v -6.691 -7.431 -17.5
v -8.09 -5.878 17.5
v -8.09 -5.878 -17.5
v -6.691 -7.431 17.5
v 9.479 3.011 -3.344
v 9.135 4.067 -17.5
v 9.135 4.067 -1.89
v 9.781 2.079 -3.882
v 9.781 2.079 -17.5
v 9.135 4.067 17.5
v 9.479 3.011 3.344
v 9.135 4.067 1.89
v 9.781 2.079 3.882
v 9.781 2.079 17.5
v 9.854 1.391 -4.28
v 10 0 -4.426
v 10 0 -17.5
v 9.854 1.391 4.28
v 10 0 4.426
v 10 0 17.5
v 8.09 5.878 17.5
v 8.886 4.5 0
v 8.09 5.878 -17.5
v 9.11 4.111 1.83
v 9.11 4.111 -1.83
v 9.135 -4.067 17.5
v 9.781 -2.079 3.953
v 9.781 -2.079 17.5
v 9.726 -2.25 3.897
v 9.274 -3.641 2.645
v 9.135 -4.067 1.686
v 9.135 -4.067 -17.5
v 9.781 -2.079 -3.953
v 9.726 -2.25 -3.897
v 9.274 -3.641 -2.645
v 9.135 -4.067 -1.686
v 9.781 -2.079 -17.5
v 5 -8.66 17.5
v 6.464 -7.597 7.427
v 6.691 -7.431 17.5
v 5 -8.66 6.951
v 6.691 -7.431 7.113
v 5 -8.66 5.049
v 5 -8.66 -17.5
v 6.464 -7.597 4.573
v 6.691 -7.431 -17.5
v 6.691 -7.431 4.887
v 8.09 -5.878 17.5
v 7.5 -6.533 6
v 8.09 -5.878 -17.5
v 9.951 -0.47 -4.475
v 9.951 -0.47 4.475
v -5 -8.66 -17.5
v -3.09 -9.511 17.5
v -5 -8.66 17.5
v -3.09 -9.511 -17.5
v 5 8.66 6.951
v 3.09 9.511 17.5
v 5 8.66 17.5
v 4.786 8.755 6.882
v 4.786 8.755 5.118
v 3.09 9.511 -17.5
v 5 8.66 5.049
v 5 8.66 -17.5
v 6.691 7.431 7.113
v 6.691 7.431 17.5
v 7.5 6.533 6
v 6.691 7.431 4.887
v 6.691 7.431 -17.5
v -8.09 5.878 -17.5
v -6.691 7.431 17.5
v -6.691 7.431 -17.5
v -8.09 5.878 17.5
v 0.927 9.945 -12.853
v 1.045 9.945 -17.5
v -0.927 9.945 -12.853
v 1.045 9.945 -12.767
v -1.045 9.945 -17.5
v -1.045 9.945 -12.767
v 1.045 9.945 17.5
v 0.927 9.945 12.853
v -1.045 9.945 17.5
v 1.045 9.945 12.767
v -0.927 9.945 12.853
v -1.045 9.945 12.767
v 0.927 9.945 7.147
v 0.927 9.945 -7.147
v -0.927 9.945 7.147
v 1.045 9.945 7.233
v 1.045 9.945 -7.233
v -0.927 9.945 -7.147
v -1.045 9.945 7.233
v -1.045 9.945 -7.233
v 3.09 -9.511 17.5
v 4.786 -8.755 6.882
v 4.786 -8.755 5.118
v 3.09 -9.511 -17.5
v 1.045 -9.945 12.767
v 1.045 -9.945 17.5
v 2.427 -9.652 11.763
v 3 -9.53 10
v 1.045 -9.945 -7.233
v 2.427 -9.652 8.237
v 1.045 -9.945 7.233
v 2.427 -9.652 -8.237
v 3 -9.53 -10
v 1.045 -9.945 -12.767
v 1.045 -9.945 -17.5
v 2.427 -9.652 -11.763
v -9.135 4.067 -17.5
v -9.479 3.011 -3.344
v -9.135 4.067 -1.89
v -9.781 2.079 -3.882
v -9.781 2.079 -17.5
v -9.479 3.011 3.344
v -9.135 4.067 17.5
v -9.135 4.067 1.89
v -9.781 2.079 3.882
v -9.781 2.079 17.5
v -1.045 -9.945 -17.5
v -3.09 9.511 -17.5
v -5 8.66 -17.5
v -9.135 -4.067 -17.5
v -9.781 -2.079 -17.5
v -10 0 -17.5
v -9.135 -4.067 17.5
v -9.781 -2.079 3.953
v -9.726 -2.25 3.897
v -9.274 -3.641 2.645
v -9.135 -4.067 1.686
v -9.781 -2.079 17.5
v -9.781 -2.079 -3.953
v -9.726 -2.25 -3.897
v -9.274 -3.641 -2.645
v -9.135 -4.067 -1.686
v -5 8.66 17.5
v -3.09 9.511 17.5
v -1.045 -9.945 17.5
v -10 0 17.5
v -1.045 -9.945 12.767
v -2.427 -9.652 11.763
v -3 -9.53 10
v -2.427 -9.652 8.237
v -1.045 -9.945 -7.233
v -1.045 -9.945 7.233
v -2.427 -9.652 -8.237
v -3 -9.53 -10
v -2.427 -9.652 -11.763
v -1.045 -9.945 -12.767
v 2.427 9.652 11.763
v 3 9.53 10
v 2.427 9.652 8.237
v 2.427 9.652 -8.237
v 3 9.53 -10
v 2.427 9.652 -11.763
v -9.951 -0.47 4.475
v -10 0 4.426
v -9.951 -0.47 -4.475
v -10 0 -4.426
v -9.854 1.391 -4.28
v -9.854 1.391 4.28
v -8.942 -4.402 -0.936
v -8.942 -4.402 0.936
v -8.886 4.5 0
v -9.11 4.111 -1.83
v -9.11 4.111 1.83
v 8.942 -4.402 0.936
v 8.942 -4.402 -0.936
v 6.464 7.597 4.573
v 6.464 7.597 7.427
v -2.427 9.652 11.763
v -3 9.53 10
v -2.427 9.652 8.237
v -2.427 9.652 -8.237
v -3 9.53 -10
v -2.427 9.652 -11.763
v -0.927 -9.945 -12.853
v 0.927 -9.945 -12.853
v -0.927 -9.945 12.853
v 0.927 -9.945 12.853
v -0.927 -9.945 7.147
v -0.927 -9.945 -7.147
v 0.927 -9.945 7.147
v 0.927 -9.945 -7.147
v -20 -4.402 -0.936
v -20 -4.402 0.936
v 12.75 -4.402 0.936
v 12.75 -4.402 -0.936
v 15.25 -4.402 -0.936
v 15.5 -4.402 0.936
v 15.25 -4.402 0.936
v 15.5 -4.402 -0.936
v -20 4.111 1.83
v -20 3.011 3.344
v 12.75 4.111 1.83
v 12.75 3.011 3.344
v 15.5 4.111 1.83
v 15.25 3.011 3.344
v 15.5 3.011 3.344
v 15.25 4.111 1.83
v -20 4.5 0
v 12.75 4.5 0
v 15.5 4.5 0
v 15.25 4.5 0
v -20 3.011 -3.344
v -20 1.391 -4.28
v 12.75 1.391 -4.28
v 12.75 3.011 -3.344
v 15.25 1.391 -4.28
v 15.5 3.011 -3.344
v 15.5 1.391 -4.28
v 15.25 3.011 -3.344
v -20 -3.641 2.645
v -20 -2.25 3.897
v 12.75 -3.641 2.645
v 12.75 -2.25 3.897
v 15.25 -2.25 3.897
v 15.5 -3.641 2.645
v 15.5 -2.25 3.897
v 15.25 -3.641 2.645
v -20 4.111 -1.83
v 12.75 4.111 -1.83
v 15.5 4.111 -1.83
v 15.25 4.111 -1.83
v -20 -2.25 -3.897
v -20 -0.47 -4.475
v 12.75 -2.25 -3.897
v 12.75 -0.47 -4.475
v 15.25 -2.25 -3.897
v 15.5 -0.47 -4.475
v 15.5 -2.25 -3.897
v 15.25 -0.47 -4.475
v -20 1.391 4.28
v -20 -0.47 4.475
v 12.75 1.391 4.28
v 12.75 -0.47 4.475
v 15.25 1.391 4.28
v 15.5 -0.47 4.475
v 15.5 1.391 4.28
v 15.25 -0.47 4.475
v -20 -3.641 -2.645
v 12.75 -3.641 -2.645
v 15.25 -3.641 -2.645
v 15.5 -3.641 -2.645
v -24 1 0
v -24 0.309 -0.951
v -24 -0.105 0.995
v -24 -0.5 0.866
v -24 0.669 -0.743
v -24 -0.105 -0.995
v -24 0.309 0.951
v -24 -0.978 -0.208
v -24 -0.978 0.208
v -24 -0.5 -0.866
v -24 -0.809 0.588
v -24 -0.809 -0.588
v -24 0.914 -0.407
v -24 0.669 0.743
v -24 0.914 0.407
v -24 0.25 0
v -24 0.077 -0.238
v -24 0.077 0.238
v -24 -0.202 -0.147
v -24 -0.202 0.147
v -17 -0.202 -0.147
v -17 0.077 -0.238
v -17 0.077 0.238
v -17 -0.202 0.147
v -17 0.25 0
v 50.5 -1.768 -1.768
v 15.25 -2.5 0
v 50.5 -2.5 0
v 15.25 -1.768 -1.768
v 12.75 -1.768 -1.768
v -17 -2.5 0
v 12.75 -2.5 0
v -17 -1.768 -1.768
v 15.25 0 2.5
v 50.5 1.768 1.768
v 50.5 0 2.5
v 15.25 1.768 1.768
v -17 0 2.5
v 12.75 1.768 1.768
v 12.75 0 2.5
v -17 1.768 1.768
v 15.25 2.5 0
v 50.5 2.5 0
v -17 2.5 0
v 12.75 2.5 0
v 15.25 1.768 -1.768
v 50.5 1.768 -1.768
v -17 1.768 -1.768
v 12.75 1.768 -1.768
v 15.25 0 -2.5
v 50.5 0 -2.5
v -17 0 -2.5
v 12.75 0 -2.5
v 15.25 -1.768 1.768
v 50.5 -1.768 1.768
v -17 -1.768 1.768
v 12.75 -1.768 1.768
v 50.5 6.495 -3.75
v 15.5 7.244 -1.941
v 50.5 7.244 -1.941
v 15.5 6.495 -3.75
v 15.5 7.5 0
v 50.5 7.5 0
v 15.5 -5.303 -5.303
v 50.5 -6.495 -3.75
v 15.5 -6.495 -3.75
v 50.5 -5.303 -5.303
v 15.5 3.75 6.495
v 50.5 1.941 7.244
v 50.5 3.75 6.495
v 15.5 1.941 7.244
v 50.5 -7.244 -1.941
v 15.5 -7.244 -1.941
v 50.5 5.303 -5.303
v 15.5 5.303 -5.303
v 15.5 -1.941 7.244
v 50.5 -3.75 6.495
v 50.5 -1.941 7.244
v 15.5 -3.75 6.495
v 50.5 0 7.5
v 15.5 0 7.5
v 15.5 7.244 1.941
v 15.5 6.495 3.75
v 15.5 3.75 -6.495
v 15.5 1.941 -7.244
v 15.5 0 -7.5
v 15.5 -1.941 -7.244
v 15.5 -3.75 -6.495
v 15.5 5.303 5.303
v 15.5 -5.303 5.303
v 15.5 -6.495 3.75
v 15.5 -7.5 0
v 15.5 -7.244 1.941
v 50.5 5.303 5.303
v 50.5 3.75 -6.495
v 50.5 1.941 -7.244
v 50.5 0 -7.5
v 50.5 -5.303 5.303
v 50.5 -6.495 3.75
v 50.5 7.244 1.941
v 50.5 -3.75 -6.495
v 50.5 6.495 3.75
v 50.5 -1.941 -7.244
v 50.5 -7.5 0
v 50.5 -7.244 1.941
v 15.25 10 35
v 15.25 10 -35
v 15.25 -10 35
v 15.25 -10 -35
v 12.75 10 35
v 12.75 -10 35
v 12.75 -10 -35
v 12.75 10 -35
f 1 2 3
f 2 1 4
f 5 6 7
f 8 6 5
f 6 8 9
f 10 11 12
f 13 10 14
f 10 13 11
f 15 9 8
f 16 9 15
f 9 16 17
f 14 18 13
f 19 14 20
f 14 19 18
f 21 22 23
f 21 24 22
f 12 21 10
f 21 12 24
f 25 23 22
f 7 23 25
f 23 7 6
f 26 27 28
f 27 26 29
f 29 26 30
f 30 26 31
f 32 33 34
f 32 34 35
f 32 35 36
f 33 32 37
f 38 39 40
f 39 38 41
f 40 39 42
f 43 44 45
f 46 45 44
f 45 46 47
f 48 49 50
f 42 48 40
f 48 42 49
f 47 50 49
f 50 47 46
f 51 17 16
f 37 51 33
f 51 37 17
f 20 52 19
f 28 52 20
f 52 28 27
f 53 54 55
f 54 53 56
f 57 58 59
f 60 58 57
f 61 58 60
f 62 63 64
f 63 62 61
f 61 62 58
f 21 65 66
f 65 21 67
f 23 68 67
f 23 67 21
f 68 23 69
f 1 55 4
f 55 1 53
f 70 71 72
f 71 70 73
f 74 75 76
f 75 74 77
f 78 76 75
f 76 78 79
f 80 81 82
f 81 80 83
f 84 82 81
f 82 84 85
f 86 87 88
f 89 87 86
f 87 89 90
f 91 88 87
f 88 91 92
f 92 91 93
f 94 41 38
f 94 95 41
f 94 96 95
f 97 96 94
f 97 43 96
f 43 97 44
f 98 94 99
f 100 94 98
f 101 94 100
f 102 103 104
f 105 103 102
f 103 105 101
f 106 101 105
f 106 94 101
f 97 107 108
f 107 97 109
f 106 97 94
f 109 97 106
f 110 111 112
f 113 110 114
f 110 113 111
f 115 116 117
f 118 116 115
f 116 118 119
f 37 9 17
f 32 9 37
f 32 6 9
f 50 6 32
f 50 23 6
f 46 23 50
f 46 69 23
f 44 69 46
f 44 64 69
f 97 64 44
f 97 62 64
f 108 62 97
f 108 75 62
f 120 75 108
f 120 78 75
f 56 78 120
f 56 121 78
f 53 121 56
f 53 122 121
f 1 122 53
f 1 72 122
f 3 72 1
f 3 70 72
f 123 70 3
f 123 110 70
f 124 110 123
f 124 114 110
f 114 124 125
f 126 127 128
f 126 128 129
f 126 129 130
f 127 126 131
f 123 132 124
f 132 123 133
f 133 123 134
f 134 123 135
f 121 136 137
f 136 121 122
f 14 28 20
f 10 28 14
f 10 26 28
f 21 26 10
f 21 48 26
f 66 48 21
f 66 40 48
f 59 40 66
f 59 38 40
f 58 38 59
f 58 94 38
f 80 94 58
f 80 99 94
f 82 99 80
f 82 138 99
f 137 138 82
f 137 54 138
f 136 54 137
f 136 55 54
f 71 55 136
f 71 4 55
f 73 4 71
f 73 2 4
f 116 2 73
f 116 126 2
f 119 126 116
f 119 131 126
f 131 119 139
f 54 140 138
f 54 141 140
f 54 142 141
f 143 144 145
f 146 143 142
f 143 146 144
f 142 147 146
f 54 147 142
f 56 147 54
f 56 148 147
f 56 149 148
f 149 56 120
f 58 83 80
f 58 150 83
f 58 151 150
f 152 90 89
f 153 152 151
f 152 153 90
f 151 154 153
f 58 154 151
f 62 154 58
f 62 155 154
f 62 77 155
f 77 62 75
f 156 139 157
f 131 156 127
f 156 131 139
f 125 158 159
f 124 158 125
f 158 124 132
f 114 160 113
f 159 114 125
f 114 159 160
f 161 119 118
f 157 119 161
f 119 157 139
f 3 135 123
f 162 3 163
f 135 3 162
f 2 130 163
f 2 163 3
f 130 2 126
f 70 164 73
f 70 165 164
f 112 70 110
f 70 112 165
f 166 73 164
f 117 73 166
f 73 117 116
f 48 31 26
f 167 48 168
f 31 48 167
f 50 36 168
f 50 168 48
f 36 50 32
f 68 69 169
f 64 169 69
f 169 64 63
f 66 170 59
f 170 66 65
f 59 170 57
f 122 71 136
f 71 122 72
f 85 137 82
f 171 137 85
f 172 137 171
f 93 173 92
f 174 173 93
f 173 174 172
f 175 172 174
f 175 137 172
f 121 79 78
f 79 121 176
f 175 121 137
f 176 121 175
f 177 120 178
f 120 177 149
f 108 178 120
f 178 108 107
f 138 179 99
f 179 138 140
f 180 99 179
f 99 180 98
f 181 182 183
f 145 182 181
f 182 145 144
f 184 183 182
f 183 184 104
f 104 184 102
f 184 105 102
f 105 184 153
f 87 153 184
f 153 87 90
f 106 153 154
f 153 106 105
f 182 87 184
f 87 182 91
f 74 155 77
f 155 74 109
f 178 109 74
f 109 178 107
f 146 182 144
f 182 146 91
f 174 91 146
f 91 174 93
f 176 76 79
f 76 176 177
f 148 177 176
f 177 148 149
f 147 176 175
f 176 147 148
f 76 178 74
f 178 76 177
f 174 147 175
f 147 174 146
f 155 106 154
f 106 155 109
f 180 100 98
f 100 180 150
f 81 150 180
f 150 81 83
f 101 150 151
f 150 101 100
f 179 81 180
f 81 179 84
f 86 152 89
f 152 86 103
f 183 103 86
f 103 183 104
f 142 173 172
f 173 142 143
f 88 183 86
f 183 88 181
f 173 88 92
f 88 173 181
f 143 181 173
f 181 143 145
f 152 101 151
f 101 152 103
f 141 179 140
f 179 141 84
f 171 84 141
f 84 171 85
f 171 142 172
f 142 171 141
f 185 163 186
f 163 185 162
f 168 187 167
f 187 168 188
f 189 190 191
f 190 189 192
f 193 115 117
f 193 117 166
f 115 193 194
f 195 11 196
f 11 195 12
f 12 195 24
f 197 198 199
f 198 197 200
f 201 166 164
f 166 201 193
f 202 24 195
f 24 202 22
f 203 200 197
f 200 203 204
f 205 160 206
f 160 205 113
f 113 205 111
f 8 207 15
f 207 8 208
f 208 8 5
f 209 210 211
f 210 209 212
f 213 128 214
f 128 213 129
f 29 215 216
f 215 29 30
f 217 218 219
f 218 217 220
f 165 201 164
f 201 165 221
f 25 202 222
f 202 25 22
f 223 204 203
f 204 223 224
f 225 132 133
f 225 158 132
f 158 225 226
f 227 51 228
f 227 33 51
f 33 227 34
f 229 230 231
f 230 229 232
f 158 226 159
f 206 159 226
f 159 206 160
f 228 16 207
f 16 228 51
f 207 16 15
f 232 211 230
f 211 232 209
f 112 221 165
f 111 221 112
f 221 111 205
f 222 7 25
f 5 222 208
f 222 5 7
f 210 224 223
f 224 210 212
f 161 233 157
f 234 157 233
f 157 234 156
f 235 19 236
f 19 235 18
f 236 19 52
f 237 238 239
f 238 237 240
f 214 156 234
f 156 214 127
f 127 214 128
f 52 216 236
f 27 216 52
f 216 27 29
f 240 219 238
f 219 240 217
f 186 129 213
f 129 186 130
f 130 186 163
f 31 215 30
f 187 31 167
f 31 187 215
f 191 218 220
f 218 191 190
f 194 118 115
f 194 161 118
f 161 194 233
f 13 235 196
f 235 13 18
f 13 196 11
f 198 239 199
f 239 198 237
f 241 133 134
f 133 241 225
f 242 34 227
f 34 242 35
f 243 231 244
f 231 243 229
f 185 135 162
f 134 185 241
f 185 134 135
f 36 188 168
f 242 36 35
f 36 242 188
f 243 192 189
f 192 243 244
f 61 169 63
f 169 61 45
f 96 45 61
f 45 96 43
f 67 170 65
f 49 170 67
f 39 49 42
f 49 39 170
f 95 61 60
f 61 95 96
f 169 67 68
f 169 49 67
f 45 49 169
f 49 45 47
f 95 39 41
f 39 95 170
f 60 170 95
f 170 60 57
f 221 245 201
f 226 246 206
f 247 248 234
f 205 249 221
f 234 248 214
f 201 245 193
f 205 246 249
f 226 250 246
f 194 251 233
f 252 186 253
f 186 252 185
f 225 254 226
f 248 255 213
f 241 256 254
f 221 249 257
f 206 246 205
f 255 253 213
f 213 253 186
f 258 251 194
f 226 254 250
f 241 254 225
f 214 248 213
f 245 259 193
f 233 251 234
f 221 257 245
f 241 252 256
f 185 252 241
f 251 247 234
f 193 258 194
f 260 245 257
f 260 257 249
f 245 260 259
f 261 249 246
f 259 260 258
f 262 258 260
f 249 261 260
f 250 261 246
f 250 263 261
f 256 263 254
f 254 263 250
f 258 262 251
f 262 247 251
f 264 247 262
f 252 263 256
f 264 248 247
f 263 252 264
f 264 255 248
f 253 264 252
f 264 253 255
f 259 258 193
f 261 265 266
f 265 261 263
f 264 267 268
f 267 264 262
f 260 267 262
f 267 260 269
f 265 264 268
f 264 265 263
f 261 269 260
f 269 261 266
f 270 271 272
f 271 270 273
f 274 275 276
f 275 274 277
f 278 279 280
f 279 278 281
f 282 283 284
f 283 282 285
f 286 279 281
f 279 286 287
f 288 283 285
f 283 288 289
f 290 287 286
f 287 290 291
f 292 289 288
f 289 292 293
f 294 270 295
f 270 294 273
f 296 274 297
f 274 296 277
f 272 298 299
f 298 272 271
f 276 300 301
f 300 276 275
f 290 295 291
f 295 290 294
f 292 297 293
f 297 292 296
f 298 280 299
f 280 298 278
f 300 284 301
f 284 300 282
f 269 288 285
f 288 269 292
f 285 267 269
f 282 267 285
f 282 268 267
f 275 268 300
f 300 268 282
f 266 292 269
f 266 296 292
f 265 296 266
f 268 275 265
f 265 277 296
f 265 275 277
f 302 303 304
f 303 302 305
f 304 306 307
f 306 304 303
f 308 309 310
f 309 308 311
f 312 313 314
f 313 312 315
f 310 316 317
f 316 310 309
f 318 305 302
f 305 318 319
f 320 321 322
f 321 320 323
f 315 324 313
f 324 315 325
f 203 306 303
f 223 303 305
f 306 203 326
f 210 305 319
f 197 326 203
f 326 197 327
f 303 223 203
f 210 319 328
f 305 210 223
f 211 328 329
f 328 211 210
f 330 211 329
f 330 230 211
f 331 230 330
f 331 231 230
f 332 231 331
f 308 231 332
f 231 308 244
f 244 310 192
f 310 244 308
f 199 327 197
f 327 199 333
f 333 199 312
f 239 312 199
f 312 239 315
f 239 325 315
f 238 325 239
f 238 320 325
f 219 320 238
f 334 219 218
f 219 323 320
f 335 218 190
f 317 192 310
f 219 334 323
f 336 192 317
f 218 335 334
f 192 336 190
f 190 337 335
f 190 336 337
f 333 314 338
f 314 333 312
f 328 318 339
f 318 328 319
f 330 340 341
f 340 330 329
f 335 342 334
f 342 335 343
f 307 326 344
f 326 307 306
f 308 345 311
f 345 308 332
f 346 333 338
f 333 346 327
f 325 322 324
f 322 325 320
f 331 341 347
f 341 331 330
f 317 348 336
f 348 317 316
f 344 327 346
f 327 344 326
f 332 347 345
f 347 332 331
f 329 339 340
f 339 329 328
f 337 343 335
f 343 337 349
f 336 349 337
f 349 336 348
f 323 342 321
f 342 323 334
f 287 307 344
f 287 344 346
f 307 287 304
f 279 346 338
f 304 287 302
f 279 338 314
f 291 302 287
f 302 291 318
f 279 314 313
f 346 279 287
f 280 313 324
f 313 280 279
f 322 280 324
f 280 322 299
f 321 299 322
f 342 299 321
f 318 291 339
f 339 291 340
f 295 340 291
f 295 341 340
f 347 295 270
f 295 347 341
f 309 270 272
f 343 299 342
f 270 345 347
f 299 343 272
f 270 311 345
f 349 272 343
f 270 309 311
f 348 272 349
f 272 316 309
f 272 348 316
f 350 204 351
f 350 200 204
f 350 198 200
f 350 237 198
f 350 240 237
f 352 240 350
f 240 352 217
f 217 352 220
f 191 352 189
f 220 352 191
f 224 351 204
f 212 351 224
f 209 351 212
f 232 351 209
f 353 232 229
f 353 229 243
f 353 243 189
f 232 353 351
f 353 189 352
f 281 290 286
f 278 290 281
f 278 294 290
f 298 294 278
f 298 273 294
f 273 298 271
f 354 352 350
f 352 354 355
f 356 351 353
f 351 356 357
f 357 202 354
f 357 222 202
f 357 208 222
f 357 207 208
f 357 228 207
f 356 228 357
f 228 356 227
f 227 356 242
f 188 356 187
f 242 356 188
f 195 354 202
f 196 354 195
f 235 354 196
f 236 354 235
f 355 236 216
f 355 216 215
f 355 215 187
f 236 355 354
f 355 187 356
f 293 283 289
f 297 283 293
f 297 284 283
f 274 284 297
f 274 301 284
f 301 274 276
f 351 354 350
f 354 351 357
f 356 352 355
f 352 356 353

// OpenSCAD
//include <C:/Program Files/OpenSCAD/libraries/MCAD/hardware.scad>

radius =10;
width = 35;

// heater block
difference() {
	cylinder(h=width, r=radius, center=true);
	// resistor wholes
	translate ([0,0,-10]) rotate ([90,0,0])  cylinder (h = radius*2, r=3, center = true);
	translate ([0,0,10])rotate ([90,0,0])  cylinder (h = radius*2, r=3, center = true);
	
	// hotend whole
	//translate ([0,0,0])rotate ([90,0,0])  cylinder (h = radius*2, r=4.5, center = true);
	translate ([0,0,0])rotate ([90,0,90])  cylinder (h = radius*2, r=4.5, center = true);
	
	// terminstor whole
	translate ([6,0,6])rotate ([90,0,0])  cylinder (h = radius*2, r=1.5, center = true);
}

// hotend
difference() {
	union() {
		translate ([-22,0,0])rotate ([-90,0,90])cylinder(h = 4, r1 =4.5, r2 = 1, center = true);
		translate ([0,0,0])rotate ([90,0,90])  cylinder (h = 40, r=4.5, center = true);
	}
	
	translate ([0,0,0])rotate ([90,0,90])  cylinder (h = 49, r=0.25, center = true);
	translate ([2,0,0])rotate ([90,0,90])  cylinder (h = 38, r=2.5, center = true);
}

// isulator block
difference() {
	translate ([33,0,0])rotate ([-90,0,90])cylinder(h = 35, r =7.5,  center = true);
	translate ([33,0,0])rotate ([-90,0,90])cylinder(h = 35, r =2.5,  center = true);

}
// holder
translate ([14,0,0]) cube(size = [2.5,20,70], center = true);
